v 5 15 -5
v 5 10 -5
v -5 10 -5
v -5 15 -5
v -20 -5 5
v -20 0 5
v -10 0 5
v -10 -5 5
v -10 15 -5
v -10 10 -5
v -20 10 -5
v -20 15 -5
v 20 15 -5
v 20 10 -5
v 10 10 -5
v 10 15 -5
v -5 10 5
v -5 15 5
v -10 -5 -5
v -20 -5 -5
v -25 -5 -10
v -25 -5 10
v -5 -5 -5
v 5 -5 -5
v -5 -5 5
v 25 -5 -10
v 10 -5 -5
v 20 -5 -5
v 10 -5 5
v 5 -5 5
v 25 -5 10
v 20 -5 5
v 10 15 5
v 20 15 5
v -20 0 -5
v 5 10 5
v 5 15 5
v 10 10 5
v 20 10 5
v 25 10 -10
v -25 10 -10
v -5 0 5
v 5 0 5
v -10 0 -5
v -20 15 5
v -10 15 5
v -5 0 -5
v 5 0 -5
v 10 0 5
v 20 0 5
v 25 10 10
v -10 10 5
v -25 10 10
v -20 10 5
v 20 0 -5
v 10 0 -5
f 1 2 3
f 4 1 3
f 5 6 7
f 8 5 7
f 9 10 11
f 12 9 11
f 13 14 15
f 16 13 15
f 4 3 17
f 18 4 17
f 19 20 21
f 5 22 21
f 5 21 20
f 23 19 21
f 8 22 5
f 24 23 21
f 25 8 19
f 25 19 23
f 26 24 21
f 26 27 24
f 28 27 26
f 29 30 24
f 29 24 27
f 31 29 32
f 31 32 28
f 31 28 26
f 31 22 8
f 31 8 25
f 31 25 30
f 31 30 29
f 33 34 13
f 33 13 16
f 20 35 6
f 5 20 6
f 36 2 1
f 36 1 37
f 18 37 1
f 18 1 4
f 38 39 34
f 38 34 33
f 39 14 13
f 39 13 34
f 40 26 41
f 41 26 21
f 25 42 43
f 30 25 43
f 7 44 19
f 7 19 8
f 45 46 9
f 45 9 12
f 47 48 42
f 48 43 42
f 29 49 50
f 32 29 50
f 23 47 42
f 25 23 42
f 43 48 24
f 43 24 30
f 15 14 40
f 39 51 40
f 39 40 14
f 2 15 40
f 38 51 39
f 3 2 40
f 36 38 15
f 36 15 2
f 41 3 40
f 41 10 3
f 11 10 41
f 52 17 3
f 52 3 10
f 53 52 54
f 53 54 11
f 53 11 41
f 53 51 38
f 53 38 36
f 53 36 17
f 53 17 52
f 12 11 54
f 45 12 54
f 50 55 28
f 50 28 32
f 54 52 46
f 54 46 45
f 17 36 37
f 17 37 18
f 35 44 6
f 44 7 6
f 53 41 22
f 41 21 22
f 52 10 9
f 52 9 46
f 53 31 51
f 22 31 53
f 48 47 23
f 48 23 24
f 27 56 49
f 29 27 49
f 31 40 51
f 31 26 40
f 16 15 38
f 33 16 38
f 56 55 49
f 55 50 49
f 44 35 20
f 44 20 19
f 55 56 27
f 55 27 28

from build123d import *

# Parameters (mm, degrees)
F0_W     = 50
F0_H     = 20
F0_W_2   = 10
F0_H_2   = 10
F1_DEPTH = 5
F2_W     = 50
F2_H     = 20
F3_DEPTH = 10
F4_W     = 10
F4_H     = 10
F5_DEPTH = 5


with BuildPart() as f1:
    # F0 (on Front) → F1 (new body)
    with BuildSketch(Plane.XZ):
        Rectangle(F0_W, F0_H)
        with Locations((-15, 0)):
            Rectangle(F0_W_2, F0_H_2, mode=Mode.SUBTRACT)
        Rectangle(F0_W_2, F0_H_2, mode=Mode.SUBTRACT)
        with Locations((15, 0)):
            Rectangle(F0_W_2, F0_H_2, mode=Mode.SUBTRACT)
    extrude(amount=F1_DEPTH)

    # F2 (on face) → F3 (join)
    with BuildSketch(Plane(origin=(0, 0, 0), x_dir=(-1, 0, 0), z_dir=(0, 1, 0))):
        Rectangle(F2_W, F2_H)
    extrude(amount=F3_DEPTH)

    # F4 (on face) → F5 (join)
    with BuildSketch(Plane(origin=(0, 10, 0), x_dir=(-1, 0, 0), z_dir=(0, 1, 0))):
        Rectangle(F4_W, F4_H)
        with Locations((-15, 0)):
            Rectangle(F4_W, F4_H)
        with Locations((15, 0)):
            Rectangle(F4_W, F4_H)
    extrude(amount=F5_DEPTH)


solid = f1.part
